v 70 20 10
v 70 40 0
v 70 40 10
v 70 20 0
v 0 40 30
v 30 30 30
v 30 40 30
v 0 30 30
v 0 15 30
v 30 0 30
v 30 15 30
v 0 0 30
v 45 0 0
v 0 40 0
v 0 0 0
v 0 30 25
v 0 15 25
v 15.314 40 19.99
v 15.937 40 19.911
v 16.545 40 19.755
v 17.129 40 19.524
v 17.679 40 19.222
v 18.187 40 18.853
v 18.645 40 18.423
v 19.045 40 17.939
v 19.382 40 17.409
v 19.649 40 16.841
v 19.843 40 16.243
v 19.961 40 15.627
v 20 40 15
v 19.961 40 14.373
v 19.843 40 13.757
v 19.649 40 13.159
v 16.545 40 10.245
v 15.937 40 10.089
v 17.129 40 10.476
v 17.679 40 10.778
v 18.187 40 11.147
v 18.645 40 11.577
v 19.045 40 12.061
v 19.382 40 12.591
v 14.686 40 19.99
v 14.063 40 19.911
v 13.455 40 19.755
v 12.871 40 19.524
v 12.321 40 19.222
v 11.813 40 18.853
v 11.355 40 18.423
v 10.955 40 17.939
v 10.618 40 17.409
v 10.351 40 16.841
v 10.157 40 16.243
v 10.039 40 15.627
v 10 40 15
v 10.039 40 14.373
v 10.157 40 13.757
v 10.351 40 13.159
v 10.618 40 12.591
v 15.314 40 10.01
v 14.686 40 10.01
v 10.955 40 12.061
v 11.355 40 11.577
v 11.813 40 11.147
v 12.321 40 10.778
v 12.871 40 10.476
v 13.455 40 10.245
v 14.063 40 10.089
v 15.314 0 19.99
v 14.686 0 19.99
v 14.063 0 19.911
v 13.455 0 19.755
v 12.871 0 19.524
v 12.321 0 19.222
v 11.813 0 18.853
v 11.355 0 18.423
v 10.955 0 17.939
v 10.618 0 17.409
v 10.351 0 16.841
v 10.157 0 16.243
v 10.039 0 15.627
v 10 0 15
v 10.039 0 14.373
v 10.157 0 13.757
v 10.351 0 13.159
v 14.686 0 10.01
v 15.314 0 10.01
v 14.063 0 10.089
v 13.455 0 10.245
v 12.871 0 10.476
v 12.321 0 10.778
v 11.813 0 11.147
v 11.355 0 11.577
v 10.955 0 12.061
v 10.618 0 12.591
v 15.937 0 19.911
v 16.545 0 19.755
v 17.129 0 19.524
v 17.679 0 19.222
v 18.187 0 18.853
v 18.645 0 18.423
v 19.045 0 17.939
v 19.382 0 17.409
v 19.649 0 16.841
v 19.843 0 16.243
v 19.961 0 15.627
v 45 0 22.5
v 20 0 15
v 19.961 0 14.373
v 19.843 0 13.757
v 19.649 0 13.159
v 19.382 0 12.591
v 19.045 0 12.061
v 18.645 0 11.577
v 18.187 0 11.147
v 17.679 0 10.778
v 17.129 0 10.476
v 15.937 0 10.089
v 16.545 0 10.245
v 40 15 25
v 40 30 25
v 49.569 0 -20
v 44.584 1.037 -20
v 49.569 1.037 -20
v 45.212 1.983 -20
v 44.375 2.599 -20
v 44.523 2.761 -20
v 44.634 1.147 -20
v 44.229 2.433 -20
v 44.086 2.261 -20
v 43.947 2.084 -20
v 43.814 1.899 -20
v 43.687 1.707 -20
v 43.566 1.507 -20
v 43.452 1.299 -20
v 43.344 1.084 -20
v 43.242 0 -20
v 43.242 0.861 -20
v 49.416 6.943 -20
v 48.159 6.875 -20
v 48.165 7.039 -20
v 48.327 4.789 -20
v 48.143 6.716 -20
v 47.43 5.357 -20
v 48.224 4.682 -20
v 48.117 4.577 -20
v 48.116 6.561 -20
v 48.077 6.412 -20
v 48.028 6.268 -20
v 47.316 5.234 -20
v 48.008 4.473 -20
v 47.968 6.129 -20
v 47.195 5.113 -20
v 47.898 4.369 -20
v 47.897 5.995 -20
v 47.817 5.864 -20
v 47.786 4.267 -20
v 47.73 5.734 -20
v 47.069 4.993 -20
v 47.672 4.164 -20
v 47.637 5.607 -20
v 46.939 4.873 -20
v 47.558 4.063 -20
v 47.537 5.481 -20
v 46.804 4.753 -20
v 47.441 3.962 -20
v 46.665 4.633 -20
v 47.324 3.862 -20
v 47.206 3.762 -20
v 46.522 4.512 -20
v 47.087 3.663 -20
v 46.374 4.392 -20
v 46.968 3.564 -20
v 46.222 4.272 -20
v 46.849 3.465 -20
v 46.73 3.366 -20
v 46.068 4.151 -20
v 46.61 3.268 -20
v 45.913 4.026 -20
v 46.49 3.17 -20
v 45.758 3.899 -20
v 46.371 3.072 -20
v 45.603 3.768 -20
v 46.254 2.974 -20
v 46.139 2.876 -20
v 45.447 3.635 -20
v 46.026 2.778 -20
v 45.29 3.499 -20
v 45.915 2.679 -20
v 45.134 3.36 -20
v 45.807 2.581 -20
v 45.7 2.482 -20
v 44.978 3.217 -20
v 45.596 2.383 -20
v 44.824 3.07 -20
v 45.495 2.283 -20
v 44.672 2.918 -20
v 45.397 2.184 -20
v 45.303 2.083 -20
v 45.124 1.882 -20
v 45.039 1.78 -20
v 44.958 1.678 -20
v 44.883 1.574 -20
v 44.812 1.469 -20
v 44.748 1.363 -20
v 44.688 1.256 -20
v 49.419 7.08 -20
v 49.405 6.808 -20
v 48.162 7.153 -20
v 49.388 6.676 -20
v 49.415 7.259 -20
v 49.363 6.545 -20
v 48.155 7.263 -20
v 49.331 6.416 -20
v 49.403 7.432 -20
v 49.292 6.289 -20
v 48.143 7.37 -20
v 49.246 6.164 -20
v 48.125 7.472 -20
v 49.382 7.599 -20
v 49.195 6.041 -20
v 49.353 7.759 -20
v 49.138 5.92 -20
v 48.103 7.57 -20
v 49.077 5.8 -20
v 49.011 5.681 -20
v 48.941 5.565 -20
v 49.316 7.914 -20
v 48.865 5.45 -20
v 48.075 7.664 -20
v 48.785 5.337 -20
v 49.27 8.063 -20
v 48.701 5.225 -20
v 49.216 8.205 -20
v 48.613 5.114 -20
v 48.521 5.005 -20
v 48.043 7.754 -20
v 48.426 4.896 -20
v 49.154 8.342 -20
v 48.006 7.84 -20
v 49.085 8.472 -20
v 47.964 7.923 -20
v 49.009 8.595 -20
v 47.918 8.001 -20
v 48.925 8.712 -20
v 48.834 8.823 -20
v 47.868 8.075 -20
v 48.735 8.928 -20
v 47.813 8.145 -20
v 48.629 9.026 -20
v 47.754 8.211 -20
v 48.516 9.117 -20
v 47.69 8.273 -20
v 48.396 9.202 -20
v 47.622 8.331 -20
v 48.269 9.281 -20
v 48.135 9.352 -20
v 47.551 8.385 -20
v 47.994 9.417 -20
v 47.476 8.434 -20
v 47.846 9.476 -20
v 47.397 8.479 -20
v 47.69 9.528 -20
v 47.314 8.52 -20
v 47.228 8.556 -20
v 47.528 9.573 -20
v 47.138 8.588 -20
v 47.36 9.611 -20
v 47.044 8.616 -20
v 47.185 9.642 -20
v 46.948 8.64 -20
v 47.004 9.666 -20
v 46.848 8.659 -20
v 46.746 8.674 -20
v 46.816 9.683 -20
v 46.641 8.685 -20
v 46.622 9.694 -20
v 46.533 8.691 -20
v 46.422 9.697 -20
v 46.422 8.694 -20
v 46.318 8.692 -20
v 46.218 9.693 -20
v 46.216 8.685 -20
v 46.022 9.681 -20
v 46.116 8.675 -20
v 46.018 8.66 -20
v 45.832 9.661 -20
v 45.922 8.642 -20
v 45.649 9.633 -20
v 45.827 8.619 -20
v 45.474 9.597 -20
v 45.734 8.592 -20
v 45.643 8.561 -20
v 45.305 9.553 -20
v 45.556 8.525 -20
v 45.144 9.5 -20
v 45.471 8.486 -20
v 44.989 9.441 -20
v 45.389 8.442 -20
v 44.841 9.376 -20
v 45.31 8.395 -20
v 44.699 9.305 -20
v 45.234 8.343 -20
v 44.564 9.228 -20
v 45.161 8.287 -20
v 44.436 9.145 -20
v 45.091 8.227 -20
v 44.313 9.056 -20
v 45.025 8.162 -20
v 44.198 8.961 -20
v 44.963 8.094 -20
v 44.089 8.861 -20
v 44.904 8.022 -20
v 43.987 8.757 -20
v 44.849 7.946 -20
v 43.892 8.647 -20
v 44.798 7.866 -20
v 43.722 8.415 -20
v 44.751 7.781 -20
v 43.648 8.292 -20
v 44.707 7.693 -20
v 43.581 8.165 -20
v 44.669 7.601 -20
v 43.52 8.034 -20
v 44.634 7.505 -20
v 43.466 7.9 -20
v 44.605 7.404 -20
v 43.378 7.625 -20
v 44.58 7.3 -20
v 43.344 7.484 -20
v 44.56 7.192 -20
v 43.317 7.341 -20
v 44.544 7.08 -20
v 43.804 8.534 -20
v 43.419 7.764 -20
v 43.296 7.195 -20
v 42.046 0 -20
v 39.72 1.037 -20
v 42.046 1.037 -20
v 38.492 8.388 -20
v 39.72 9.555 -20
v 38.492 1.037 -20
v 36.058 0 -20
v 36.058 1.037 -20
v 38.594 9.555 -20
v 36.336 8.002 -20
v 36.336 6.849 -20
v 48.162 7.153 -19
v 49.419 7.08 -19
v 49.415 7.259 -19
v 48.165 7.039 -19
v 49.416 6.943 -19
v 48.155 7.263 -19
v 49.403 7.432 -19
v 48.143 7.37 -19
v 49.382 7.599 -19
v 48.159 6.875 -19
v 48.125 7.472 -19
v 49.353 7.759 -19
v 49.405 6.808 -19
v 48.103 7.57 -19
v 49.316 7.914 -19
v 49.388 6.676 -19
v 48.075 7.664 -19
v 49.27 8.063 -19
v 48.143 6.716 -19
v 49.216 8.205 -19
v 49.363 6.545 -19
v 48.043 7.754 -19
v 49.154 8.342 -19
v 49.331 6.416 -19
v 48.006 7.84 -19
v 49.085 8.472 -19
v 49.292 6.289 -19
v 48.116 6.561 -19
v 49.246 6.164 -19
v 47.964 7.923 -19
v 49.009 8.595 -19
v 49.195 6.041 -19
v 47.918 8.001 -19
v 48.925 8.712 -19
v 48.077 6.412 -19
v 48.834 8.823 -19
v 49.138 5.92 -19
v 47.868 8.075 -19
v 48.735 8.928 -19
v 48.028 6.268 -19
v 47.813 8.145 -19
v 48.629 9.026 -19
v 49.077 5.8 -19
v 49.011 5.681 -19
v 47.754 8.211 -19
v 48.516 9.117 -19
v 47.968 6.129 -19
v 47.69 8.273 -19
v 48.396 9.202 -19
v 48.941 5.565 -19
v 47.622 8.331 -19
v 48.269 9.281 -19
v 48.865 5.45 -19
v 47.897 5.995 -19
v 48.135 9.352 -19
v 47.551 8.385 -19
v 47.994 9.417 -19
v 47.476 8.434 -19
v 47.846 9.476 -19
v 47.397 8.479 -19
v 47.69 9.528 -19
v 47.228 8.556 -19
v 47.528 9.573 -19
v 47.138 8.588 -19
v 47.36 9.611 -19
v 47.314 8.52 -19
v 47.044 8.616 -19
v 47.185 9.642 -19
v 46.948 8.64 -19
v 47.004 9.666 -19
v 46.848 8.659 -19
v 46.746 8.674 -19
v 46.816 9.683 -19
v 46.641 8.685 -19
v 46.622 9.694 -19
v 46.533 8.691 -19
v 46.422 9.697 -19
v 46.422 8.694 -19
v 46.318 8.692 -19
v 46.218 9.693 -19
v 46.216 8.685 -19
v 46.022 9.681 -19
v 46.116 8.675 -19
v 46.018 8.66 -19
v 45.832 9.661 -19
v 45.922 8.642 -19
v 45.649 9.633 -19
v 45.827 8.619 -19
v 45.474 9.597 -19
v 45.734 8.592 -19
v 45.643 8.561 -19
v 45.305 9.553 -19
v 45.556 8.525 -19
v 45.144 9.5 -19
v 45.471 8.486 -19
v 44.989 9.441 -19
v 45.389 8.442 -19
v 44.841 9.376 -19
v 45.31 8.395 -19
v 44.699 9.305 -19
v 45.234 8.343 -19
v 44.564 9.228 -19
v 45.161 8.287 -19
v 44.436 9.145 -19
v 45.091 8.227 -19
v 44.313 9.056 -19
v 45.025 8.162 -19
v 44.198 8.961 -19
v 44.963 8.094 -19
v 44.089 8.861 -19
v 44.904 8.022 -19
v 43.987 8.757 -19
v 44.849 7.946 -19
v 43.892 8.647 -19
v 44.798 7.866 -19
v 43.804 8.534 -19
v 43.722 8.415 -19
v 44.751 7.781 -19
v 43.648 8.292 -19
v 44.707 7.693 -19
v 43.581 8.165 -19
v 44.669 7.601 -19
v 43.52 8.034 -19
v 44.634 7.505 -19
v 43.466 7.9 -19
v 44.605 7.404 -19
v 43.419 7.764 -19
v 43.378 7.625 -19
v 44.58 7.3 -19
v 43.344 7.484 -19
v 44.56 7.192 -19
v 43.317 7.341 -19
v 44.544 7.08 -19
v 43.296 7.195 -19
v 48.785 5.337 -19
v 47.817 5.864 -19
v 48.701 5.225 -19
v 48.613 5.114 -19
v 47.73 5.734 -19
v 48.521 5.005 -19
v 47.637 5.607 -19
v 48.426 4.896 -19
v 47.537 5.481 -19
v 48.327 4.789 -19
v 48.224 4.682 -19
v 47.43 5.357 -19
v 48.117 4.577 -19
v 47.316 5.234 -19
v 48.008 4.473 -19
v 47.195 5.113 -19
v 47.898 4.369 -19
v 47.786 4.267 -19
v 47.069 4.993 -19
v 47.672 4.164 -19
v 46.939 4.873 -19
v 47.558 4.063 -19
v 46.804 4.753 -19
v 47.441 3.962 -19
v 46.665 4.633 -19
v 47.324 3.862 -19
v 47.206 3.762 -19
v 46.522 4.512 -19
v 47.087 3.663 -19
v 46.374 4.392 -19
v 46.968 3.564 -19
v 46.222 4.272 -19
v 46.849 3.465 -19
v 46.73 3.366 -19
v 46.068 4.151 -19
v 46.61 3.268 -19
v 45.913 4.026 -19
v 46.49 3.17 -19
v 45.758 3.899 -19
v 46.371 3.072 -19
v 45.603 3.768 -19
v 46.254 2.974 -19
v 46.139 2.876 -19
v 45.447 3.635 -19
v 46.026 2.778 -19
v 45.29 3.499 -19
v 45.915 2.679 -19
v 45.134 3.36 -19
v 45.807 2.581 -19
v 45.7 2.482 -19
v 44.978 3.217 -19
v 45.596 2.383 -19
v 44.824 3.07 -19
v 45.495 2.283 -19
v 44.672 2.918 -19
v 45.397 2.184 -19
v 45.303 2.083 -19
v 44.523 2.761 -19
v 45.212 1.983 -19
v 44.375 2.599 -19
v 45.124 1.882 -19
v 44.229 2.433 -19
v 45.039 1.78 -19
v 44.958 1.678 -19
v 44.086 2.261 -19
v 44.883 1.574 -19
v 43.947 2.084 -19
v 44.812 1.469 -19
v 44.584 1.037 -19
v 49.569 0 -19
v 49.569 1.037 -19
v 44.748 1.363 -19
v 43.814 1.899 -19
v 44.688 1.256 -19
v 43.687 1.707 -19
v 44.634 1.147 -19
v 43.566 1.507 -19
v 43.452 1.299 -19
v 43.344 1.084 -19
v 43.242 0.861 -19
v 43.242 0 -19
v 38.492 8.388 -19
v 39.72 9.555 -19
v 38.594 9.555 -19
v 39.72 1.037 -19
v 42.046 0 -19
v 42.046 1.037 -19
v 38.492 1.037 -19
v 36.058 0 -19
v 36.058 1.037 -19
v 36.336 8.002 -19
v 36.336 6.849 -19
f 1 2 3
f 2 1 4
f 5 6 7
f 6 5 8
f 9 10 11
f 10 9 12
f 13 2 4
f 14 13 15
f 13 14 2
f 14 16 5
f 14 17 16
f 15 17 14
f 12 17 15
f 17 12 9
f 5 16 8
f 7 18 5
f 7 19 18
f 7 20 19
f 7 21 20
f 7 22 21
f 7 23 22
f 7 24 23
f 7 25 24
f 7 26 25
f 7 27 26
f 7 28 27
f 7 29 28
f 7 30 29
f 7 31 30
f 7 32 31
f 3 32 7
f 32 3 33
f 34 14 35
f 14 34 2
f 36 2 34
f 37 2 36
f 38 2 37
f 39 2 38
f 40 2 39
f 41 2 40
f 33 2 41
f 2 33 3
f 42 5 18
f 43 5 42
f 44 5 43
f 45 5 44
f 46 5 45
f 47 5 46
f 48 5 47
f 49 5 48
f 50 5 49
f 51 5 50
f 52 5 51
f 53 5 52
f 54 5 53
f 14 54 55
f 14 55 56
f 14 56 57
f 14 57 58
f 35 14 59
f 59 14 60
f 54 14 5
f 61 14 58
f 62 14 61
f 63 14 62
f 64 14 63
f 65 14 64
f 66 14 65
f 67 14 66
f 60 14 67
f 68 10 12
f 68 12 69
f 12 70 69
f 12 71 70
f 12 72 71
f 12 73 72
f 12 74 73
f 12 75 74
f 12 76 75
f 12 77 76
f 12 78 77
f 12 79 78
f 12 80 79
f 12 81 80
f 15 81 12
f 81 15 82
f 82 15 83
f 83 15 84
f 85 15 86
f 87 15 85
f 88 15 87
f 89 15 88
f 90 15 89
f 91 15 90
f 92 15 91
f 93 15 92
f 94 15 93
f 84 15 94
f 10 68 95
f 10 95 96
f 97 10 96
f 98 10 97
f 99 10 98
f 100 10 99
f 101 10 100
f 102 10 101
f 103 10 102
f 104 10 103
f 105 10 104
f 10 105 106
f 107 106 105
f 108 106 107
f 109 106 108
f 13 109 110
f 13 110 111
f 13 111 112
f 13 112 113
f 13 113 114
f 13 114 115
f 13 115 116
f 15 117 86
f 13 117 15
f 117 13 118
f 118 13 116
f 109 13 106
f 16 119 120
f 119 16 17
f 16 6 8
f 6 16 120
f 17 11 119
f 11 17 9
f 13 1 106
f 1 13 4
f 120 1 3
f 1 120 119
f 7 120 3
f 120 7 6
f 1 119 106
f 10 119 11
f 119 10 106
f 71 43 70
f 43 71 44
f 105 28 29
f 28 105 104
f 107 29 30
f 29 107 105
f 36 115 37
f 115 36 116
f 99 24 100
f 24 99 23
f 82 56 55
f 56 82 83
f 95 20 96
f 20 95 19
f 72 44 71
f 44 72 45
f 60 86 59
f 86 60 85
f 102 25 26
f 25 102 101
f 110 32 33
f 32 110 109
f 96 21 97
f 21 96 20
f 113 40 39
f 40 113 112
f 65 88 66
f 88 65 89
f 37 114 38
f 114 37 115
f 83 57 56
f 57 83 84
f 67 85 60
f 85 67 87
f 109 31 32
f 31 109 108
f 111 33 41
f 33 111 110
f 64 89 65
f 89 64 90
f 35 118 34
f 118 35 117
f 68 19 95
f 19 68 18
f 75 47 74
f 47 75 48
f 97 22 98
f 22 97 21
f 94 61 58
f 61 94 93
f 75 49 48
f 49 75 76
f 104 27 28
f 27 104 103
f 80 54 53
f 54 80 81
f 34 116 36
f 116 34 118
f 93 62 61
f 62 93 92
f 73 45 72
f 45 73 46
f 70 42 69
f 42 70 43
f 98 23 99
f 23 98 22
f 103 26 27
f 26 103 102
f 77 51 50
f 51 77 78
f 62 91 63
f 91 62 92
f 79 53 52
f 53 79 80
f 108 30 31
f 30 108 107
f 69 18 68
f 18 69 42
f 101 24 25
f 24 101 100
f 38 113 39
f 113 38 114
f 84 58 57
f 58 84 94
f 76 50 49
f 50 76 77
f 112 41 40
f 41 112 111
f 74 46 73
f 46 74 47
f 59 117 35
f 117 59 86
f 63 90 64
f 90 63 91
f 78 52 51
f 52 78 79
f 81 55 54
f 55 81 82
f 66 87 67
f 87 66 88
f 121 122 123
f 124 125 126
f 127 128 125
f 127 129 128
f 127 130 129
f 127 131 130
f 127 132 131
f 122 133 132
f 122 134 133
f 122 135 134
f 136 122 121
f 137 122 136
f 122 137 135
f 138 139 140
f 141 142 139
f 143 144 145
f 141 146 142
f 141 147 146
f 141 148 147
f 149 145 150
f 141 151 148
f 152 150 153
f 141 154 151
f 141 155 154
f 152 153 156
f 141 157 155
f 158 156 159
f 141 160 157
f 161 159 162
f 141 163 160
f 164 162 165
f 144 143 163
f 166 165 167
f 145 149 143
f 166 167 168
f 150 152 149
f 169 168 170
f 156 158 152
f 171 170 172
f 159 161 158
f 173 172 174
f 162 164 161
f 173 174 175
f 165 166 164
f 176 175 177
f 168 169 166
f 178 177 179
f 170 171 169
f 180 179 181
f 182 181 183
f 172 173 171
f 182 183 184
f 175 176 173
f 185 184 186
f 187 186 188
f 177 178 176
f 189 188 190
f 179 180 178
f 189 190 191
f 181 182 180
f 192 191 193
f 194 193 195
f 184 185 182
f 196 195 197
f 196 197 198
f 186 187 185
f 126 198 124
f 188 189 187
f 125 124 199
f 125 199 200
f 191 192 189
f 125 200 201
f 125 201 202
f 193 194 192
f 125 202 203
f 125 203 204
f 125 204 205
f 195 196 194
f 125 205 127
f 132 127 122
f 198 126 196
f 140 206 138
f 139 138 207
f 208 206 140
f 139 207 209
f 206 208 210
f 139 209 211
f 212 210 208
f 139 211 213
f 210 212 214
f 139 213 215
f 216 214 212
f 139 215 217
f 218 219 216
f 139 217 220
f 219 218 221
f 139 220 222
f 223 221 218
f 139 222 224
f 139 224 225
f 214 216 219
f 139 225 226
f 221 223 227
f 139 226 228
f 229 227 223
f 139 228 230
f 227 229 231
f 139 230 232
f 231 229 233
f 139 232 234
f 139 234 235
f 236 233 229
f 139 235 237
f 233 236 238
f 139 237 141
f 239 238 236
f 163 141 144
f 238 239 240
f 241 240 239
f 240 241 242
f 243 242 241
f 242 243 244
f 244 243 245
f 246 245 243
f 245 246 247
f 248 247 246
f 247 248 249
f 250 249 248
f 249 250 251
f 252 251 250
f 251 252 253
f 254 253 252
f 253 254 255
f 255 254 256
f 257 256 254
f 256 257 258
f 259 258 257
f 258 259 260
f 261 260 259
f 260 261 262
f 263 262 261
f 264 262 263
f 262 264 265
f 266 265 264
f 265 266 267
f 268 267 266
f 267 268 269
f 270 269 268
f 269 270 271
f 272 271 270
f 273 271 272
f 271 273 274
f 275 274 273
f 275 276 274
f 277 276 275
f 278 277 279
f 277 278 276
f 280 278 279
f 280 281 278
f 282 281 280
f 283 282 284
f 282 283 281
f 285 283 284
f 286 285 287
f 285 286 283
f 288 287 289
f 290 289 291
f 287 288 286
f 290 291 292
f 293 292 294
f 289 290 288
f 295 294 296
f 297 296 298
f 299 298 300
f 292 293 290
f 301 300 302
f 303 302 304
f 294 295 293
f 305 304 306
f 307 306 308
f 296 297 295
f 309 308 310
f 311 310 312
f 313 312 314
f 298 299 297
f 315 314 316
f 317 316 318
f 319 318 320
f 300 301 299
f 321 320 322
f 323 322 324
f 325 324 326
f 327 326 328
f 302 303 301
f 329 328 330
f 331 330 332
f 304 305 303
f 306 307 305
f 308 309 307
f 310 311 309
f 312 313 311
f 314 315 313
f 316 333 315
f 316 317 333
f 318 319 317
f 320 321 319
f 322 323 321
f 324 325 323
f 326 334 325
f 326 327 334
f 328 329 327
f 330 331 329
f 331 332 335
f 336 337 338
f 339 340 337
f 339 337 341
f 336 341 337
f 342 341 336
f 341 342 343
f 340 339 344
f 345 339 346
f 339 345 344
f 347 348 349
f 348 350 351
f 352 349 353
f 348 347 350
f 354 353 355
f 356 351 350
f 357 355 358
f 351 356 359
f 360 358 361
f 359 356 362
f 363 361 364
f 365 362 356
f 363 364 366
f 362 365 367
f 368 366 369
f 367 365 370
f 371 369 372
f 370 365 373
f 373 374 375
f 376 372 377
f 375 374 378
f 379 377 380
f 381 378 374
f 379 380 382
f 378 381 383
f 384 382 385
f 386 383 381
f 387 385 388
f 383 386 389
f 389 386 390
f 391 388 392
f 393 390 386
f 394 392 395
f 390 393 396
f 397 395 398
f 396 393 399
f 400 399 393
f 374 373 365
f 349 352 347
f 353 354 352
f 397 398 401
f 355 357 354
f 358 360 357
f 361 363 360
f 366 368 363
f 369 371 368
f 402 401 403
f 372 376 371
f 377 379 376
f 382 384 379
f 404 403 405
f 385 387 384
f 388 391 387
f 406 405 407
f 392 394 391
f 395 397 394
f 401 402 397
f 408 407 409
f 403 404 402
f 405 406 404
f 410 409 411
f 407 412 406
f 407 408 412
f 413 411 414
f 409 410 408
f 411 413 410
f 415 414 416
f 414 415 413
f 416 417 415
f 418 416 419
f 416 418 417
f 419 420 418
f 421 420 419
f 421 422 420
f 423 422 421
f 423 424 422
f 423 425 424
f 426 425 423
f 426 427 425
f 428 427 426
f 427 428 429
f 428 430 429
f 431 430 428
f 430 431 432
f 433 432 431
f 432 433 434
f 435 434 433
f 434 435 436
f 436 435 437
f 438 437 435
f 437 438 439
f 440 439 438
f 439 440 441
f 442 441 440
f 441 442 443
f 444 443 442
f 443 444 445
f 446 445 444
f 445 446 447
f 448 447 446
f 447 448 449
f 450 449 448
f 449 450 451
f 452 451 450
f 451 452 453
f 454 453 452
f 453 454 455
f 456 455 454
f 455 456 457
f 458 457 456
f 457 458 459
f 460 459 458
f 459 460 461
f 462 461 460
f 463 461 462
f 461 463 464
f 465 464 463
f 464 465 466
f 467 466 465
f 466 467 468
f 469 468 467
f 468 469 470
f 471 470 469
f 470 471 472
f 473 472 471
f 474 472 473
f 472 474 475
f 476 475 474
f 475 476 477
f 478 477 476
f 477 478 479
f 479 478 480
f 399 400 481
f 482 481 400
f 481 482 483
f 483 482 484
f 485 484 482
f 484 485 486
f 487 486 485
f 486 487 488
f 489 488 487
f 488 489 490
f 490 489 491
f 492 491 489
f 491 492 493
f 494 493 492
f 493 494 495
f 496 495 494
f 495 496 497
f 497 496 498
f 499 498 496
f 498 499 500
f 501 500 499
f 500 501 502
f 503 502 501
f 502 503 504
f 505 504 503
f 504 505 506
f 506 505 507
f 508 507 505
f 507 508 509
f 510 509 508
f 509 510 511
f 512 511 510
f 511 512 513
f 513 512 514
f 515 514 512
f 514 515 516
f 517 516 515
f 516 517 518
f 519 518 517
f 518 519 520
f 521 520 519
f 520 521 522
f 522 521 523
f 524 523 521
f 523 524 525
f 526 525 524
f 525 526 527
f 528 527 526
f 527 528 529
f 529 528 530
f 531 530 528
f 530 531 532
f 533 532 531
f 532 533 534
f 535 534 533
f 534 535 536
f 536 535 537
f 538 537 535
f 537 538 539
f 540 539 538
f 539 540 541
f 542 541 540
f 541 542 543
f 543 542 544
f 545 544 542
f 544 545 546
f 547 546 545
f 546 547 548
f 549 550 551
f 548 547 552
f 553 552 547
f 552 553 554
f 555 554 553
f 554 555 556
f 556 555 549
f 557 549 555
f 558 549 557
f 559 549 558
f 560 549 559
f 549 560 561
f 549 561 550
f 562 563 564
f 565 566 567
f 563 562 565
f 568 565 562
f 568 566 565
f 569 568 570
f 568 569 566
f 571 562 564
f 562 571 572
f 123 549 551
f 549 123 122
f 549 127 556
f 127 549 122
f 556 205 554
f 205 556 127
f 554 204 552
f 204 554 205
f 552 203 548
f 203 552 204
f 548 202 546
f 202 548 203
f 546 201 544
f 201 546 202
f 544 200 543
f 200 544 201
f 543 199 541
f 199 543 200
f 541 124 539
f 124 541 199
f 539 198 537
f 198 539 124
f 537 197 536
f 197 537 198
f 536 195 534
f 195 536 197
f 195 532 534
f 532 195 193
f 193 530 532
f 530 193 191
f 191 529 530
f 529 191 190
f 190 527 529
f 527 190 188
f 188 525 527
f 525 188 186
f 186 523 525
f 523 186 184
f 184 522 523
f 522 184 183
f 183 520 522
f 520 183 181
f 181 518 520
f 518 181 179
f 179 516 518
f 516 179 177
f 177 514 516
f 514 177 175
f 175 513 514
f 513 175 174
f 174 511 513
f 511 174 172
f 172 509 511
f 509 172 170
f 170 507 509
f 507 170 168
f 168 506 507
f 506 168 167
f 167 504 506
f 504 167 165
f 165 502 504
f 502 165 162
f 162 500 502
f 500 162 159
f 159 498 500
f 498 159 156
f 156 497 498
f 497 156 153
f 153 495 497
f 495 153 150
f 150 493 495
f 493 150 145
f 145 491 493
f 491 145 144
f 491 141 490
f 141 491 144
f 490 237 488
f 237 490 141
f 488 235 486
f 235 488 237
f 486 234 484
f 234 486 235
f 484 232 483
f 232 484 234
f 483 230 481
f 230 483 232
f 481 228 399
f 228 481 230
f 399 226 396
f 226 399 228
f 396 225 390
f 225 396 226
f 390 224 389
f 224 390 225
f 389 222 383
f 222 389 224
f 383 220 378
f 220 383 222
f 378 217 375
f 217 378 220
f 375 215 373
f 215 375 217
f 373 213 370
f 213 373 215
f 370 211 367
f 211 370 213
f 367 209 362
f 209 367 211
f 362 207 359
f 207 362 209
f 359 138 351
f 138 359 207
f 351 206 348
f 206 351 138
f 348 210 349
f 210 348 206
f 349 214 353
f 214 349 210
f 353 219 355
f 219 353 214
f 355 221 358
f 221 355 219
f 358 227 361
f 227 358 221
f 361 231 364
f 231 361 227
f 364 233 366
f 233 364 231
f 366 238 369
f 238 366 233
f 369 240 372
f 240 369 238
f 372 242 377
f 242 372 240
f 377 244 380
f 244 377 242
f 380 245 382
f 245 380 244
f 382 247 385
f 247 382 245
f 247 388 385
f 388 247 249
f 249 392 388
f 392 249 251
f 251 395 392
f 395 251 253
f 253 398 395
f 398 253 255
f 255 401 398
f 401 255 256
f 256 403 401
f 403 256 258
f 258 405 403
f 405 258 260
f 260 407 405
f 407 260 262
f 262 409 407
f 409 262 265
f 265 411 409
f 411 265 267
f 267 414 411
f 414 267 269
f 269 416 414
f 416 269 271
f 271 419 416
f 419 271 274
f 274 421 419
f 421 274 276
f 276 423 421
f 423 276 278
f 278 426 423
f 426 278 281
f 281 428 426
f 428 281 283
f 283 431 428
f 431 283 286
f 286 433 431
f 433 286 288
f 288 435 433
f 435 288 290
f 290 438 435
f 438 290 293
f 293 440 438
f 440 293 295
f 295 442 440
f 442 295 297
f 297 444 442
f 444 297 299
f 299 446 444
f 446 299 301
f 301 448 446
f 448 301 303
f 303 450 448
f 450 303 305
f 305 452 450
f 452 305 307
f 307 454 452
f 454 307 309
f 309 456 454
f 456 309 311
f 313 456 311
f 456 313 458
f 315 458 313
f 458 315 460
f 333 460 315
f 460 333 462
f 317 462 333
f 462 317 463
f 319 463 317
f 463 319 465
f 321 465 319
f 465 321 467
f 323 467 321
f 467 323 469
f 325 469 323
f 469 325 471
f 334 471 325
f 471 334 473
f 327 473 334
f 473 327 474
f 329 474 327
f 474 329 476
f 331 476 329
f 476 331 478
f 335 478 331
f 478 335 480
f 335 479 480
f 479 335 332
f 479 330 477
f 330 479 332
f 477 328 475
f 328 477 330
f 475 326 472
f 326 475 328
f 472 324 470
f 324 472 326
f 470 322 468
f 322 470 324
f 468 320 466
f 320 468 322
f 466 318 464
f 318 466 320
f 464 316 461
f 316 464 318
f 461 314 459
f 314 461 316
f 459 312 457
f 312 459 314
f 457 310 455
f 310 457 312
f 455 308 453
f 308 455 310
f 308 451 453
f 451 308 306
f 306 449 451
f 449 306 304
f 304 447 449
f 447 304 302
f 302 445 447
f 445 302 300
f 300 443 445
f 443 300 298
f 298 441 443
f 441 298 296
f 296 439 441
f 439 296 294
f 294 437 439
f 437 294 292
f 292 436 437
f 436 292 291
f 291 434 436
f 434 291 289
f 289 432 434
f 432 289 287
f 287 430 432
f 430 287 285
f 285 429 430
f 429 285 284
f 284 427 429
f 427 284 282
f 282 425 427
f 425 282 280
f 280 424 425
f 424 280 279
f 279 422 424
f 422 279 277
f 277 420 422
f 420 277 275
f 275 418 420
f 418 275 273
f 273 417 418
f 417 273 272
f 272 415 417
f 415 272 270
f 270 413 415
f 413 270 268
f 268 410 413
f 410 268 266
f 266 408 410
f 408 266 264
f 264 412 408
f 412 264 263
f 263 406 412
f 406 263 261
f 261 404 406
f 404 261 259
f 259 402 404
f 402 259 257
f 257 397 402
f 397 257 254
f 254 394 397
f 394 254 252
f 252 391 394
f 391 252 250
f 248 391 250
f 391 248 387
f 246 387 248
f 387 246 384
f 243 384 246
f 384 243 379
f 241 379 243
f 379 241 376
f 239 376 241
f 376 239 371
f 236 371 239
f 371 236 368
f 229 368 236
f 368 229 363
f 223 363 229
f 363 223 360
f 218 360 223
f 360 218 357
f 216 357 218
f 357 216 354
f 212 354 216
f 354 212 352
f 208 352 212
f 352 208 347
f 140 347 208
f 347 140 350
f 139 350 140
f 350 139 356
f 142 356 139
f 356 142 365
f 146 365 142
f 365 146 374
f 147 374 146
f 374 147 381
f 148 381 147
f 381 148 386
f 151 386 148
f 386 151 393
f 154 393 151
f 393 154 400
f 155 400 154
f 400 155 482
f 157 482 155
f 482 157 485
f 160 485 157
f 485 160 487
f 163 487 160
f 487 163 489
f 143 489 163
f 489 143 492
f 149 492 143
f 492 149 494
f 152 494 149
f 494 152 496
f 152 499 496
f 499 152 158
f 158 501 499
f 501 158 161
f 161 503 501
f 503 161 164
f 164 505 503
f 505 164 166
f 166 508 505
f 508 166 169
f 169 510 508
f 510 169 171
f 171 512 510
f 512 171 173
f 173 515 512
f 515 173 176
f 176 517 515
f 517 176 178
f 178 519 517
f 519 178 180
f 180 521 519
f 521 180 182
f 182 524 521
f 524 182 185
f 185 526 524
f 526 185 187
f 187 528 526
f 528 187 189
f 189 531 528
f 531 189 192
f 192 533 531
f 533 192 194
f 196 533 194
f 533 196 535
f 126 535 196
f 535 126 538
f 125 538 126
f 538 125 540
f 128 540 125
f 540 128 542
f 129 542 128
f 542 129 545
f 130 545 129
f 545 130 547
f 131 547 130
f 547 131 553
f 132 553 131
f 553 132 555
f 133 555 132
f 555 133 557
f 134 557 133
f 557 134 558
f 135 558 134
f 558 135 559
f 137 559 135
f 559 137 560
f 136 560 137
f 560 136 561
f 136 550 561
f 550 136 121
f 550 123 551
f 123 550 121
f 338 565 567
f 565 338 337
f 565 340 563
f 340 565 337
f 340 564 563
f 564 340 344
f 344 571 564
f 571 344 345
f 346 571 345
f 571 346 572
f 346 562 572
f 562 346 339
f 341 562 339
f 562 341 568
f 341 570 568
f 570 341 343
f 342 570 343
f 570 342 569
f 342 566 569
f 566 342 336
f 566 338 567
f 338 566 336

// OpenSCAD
$fn=50;

cw=70;
cd=40;
ch=30;
cy=10;

difference() {
    cube([cw,cd,ch]);
    translate([0,15,ch-5])
    cube([cw,15,5]);
    linear_extrude(height=ch)
    polygon([[45,0],[70,0],[70,20]]);
    translate([0,cd,10])
    rotate([90,0,0])
    linear_extrude(height=cd)
    polygon([[70,0],[cw,ch-10],[30,ch-10]]);
    translate([15,cd,15])
    rotate([90,0,0])
    cylinder(h=cd,d=10);
}

translate([cw/2,0,-20])
linear_extrude(height=1)
text("12");
